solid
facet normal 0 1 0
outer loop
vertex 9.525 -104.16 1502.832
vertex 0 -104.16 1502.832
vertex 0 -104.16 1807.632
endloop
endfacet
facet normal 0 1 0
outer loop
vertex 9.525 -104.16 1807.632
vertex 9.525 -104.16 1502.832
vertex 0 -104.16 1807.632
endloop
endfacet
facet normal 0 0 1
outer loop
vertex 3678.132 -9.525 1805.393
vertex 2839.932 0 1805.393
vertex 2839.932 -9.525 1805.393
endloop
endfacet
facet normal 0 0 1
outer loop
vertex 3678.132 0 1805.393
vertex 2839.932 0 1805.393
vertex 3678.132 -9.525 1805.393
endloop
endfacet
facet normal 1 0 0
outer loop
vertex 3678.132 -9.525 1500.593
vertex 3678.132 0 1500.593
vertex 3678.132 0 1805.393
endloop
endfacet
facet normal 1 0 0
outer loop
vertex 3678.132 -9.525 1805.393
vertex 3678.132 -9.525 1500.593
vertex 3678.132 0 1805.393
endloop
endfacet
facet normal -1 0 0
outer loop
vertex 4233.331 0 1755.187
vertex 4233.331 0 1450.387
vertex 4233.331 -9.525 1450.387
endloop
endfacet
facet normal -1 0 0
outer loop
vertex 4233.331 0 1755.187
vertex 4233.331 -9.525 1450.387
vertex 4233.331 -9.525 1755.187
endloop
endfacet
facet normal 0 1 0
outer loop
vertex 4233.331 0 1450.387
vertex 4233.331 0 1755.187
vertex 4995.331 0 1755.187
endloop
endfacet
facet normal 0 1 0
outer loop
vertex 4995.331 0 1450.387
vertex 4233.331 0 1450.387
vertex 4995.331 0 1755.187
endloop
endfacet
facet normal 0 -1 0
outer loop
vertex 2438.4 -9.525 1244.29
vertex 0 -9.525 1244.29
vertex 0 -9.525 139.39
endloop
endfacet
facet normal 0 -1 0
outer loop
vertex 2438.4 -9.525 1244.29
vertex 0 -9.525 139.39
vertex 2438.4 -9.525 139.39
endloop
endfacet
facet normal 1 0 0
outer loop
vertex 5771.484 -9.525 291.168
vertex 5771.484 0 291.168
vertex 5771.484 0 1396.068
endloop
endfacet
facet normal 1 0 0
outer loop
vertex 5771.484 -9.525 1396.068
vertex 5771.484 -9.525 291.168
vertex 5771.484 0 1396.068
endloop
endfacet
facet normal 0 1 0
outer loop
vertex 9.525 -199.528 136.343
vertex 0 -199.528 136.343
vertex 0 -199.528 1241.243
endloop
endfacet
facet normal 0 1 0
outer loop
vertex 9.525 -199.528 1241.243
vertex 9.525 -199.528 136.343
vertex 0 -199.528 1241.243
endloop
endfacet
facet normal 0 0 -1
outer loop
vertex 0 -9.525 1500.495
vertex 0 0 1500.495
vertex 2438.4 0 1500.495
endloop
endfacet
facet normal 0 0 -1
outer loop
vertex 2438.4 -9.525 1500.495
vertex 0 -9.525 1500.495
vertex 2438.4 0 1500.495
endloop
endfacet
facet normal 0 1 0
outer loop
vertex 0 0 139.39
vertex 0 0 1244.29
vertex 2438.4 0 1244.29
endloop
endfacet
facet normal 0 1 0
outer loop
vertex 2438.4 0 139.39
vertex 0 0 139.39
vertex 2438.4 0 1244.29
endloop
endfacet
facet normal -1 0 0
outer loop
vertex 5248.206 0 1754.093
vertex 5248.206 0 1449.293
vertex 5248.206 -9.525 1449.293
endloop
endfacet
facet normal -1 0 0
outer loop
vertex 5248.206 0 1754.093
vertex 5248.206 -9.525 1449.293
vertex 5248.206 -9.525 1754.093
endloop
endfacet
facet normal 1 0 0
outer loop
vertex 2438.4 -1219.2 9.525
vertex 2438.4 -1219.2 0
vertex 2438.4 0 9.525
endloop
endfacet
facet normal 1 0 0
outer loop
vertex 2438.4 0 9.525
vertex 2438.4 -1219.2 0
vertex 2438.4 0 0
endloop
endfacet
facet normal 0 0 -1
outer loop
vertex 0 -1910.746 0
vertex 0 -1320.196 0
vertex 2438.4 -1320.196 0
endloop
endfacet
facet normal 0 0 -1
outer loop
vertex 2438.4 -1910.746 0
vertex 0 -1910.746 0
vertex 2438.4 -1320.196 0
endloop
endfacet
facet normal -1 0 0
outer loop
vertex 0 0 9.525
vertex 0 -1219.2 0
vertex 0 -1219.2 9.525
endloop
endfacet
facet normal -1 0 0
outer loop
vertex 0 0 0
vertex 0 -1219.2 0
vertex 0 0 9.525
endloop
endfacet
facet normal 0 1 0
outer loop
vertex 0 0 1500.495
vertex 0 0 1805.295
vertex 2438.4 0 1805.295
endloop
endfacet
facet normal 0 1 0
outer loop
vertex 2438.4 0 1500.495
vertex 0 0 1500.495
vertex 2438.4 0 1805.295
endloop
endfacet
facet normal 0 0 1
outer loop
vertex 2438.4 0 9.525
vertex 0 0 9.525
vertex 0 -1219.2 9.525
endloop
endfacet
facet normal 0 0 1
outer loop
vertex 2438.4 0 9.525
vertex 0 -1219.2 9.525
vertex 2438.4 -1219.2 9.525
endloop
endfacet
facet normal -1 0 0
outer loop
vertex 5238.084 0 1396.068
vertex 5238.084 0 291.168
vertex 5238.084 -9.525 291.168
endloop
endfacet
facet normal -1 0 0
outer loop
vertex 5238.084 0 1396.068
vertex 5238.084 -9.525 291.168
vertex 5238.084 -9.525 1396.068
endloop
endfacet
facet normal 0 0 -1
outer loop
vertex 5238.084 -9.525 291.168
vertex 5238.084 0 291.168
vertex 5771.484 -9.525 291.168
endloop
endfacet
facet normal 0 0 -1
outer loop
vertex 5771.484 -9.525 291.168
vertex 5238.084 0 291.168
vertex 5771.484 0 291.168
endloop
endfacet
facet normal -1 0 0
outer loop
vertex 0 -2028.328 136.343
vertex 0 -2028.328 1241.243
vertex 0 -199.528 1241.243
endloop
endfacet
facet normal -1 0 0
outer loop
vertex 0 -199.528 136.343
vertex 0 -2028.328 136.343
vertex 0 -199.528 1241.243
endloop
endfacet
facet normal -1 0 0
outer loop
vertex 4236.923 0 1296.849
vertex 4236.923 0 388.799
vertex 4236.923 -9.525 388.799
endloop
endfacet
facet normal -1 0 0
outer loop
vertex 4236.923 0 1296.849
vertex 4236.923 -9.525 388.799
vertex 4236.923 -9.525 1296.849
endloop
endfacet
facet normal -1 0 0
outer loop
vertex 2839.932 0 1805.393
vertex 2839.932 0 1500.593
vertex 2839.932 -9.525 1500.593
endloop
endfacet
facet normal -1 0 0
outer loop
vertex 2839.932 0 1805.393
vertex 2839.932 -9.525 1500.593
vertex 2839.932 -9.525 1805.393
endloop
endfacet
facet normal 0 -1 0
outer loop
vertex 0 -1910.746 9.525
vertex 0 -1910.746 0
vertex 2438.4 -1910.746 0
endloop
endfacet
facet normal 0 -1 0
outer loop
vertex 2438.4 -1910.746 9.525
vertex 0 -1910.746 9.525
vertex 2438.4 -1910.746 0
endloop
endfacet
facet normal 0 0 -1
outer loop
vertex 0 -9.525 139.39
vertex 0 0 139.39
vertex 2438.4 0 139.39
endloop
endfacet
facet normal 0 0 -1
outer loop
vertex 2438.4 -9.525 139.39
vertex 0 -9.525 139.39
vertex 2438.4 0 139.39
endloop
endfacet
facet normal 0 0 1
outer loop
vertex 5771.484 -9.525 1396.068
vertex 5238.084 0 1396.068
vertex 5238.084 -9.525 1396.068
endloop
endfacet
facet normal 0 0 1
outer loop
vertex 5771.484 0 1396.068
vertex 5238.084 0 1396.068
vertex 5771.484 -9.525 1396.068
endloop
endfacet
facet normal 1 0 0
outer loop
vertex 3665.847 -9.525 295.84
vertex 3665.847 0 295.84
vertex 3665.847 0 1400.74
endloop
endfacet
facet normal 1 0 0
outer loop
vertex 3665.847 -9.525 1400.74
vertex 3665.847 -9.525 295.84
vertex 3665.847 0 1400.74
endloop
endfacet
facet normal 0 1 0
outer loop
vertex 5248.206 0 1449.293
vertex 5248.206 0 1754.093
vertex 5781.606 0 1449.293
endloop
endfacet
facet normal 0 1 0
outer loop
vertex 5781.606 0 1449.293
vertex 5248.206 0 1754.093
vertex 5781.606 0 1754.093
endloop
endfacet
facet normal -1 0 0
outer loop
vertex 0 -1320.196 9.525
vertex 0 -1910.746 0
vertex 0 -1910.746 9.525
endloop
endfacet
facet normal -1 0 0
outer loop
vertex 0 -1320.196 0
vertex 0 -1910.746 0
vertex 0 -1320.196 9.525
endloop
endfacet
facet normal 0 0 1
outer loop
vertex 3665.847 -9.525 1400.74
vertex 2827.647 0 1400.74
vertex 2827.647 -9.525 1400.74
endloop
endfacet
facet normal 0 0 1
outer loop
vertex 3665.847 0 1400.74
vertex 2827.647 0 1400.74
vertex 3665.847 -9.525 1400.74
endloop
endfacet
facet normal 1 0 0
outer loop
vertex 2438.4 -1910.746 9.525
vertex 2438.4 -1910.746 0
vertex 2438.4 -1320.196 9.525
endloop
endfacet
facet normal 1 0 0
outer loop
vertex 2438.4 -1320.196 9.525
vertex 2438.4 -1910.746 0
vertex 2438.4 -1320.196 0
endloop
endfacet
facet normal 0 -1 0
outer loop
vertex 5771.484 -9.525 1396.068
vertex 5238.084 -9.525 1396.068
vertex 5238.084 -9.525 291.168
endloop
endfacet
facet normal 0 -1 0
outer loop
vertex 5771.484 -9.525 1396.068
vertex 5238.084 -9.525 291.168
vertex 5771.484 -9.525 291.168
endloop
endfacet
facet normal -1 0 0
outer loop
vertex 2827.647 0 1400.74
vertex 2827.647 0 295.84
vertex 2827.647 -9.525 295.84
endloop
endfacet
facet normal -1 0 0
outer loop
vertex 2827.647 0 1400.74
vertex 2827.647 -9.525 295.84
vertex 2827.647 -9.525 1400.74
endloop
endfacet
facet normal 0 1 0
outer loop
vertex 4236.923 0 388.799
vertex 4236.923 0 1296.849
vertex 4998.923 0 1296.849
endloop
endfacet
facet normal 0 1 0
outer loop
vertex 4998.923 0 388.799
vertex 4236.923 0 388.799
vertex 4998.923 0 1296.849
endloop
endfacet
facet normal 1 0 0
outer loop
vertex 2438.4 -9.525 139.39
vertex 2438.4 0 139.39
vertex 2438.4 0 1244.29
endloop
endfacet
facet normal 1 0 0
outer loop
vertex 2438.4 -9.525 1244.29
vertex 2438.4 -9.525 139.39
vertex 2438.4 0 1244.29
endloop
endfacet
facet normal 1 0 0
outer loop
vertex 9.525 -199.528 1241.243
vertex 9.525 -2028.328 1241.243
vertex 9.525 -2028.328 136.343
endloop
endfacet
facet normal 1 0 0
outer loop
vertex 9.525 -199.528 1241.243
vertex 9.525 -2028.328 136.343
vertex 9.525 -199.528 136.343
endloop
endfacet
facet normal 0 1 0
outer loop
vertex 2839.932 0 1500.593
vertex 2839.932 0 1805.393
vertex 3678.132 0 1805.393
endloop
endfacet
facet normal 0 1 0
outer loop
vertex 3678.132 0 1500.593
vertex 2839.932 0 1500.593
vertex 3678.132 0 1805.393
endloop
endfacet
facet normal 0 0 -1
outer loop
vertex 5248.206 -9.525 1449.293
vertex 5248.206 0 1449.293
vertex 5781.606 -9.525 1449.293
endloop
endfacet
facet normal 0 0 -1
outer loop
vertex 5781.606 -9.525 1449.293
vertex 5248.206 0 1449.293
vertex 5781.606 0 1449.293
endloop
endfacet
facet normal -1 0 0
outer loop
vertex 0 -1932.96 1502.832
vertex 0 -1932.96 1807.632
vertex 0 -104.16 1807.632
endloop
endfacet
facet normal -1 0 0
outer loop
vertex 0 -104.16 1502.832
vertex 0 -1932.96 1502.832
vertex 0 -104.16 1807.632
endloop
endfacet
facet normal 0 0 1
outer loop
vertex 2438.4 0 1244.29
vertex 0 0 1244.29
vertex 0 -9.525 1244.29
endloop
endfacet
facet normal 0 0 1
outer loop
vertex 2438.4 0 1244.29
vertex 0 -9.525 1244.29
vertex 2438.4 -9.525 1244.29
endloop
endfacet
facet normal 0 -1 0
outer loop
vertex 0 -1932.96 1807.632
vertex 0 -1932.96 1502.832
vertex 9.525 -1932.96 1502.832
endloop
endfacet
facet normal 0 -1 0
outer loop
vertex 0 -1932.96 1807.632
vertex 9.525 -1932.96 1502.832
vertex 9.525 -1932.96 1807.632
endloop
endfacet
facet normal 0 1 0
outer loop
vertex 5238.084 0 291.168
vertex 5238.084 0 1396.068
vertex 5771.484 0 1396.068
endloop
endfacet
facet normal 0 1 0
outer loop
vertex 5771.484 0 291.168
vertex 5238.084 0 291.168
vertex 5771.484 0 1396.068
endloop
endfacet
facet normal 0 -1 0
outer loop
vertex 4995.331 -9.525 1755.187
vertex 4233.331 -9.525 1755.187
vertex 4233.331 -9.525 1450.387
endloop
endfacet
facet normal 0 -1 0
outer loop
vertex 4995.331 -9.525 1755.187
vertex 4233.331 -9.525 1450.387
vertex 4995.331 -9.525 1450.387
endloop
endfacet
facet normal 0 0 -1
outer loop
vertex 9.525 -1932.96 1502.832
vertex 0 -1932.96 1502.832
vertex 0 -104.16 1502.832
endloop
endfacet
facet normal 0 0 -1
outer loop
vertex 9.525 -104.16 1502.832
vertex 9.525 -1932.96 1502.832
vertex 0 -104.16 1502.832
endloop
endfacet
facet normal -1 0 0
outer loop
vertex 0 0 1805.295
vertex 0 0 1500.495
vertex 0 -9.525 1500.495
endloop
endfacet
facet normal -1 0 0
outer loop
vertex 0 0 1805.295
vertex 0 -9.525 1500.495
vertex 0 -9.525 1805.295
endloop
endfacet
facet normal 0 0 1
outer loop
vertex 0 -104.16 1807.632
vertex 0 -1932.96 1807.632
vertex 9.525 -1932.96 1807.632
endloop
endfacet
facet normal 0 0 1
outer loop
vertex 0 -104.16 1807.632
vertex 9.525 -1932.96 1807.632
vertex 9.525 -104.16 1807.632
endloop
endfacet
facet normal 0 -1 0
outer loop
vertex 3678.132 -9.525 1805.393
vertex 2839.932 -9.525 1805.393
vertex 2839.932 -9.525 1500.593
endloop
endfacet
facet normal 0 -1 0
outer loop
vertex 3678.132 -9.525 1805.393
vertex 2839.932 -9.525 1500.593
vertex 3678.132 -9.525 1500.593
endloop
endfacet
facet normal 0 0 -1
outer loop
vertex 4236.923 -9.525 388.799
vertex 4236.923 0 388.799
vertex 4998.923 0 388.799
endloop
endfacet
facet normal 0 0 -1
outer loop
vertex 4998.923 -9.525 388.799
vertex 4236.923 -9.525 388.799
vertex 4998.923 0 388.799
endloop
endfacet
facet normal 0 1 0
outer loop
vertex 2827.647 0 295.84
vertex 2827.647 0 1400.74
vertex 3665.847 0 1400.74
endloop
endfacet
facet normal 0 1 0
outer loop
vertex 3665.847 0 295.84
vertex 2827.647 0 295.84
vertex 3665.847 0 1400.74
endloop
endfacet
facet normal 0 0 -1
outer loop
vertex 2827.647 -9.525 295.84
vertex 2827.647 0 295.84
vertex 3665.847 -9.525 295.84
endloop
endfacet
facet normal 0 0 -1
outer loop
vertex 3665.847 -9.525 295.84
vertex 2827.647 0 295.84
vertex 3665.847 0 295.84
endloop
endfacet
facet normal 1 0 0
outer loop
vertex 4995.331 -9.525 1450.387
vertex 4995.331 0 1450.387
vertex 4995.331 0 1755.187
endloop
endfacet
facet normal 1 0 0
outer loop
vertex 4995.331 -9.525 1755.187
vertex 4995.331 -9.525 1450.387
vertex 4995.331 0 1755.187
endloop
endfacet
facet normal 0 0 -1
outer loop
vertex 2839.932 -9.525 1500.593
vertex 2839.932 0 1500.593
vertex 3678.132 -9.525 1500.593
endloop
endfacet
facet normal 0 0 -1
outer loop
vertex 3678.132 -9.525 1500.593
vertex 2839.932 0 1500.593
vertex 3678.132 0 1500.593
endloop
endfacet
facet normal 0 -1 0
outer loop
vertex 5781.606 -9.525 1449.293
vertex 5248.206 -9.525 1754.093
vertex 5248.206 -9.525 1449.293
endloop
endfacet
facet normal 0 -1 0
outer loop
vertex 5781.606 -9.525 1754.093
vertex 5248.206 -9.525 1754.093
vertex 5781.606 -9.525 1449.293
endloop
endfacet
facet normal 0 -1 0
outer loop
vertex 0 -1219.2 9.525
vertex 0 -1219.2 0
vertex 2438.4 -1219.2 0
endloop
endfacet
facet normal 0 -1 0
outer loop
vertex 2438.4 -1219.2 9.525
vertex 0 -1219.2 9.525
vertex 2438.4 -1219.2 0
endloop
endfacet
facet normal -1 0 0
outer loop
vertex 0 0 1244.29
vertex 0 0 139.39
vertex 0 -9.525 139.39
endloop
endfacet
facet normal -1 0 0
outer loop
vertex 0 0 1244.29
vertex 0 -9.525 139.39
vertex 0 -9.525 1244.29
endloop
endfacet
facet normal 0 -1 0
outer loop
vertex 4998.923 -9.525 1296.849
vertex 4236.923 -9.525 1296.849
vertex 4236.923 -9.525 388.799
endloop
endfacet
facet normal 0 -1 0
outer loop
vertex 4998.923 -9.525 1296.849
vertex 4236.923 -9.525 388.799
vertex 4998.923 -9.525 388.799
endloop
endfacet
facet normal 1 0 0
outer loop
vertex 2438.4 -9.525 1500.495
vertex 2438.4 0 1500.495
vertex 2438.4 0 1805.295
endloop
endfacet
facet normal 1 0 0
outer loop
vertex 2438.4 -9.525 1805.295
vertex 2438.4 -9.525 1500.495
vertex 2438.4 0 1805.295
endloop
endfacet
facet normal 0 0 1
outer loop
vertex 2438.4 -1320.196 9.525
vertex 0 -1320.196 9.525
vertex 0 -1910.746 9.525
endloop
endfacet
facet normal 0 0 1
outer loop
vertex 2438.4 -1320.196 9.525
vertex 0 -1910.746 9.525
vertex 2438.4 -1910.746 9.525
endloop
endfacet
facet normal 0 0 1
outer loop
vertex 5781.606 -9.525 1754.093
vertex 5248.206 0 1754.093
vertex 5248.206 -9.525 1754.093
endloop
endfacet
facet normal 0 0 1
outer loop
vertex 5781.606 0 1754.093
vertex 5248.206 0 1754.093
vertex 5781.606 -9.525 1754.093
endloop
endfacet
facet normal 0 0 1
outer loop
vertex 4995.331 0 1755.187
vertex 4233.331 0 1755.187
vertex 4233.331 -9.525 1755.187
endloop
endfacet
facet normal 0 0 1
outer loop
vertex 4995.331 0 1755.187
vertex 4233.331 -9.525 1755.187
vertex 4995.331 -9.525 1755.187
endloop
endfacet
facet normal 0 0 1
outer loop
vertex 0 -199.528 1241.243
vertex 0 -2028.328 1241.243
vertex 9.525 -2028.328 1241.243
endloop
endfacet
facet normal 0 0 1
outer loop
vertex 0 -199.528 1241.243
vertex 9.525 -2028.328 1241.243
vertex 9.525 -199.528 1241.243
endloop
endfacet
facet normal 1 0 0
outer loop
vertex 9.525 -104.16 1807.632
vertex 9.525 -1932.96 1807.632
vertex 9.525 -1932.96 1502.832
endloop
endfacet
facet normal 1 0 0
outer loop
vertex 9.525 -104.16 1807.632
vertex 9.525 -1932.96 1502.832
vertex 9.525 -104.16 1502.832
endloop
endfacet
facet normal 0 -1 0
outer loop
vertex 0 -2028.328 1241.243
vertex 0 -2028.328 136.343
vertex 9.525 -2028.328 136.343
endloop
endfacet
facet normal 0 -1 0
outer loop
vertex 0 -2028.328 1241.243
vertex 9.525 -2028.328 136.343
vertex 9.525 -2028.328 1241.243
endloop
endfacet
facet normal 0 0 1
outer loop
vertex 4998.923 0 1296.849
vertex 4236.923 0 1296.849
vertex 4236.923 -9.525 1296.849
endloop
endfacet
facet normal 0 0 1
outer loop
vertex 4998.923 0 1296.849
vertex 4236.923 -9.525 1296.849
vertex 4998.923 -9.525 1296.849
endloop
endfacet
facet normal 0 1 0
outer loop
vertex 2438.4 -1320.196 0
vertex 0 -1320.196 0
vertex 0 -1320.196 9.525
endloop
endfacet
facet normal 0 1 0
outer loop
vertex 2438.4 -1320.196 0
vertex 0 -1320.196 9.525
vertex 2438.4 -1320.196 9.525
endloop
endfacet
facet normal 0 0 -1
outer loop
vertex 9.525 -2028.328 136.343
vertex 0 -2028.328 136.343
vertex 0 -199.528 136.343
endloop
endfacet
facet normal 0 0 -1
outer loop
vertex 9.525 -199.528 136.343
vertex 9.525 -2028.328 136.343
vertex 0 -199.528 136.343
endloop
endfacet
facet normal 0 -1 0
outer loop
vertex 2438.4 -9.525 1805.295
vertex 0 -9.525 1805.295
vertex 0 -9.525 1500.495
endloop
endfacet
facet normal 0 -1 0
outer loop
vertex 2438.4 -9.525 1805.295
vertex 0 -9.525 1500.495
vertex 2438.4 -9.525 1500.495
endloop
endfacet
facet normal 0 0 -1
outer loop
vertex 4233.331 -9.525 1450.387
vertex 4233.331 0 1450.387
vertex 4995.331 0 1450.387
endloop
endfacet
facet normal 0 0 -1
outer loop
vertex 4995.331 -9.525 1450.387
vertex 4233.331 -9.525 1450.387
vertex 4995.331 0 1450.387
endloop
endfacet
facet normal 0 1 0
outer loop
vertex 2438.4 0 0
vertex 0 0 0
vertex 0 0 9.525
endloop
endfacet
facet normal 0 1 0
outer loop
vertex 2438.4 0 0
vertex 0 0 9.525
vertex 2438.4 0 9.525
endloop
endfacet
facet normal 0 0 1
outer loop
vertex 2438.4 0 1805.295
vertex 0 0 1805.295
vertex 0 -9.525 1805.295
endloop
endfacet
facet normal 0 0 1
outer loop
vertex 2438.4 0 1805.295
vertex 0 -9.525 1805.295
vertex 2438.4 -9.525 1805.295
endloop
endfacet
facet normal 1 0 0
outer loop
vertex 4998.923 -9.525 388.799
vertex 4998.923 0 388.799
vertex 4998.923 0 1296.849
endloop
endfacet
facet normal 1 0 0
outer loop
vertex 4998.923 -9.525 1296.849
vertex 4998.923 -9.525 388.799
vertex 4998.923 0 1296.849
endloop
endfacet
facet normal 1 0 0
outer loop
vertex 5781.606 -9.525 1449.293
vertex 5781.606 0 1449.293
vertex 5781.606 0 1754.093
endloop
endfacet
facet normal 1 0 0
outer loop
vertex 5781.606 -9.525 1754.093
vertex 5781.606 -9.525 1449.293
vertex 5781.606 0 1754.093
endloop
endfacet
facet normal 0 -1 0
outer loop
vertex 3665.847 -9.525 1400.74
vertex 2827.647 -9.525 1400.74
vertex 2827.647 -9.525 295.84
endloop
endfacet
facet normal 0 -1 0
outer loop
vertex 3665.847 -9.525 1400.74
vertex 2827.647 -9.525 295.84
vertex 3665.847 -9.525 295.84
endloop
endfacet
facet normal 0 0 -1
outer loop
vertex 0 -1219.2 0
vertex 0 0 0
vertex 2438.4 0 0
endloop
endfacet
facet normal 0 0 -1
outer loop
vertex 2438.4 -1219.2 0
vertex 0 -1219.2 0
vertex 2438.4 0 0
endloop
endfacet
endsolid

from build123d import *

# Parameters (mm, degrees)
F0_W      = 2438.4
F0_H      = 1219.2
F1_DEPTH  = 9.525
F2_W      = 2438.4
F2_H      = 590.55
F3_DEPTH  = 9.525
F4_W      = 2438.4
F4_H      = 1104.9
F5_DEPTH  = 9.525
F6_W      = 1828.8
F6_H      = 1104.9
F7_DEPTH  = 9.525
F8_W      = 2438.4
F8_H      = 304.8
F9_DEPTH  = 9.525
F10_W     = 1828.8
F10_H     = 304.8
F11_DEPTH = 9.525
F12_W     = 838.2
F12_H     = 1104.9
F13_DEPTH = 9.525
F14_W     = 762
F14_H     = 908.05
F15_DEPTH = 9.525
F16_W     = 762
F16_H     = 304.8
F17_DEPTH = 9.525
F18_W     = 838.2
F18_H     = 304.8
F19_DEPTH = 9.525
F20_W     = 533.4
F20_H     = 304.8
F21_DEPTH = 9.525
F22_W     = 533.4
F22_H     = 1104.9
F23_DEPTH = 9.525


with BuildPart() as f1:
    # F0 (on Top) → F1 (new body)
    with BuildSketch(Plane.XY):
        with Locations((1219.2, -609.6)):
            Rectangle(F0_W, F0_H)
    extrude(amount=F1_DEPTH)


with BuildPart() as f3:
    # F2 (on Top) → F3 (new body)
    with BuildSketch(Plane.XY):
        with Locations((1219.2, -1615.471365)):
            Rectangle(F2_W, F2_H)
    extrude(amount=F3_DEPTH)


with BuildPart() as f5:
    # F4 (on Front) → F5 (new body)
    with BuildSketch(Plane.XZ):
        with Locations((1219.2, 691.839575)):
            Rectangle(F4_W, F4_H)
    extrude(amount=F5_DEPTH)


with BuildPart() as f7:
    # F6 (on Right) → F7 (new body)
    with BuildSketch(Plane.YZ):
        with Locations((-1113.928136, 688.792892)):
            Rectangle(F6_W, F6_H)
    extrude(amount=F7_DEPTH)


with BuildPart() as f9:
    # F8 (on Front) → F9 (new body)
    with BuildSketch(Plane.XZ):
        with Locations((1219.2, 1652.895459)):
            Rectangle(F8_W, F8_H)
    extrude(amount=F9_DEPTH)


with BuildPart() as f11:
    # F10 (on Right) → F11 (new body)
    with BuildSketch(Plane.YZ):
        with Locations((-1018.56026, 1655.231595)):
            Rectangle(F10_W, F10_H)
    extrude(amount=F11_DEPTH)


with BuildPart() as f13:
    # F12 (on Front) → F13 (new body)
    with BuildSketch(Plane.XZ):
        with Locations((3246.746566, 848.290026)):
            Rectangle(F12_W, F12_H)
    extrude(amount=F13_DEPTH)


with BuildPart() as f15:
    # F14 (on Front) → F15 (new body)
    with BuildSketch(Plane.XZ):
        with Locations((4617.923316, 842.823684)):
            Rectangle(F14_W, F14_H)
    extrude(amount=F15_DEPTH)


with BuildPart() as f17:
    # F16 (on Front) → F17 (new body)
    with BuildSketch(Plane.XZ):
        with Locations((4614.331309, 1602.787137)):
            Rectangle(F16_W, F16_H)
    extrude(amount=F17_DEPTH)


with BuildPart() as f19:
    # F18 (on Front) → F19 (new body)
    with BuildSketch(Plane.XZ):
        with Locations((3259.031773, 1652.993338)):
            Rectangle(F18_W, F18_H)
    extrude(amount=F19_DEPTH)


with BuildPart() as f21:
    # F20 (on Front) → F21 (new body)
    with BuildSketch(Plane.XZ):
        with Locations((5514.90593, 1601.693132)):
            Rectangle(F20_W, F20_H)
    extrude(amount=F21_DEPTH)


with BuildPart() as f23:
    # F22 (on Front) → F23 (new body)
    with BuildSketch(Plane.XZ):
        with Locations((5504.784346, 843.618007)):
            Rectangle(F22_W, F22_H)
    extrude(amount=F23_DEPTH)


solid = Compound([f1.part, f3.part, f5.part, f7.part, f9.part, f11.part, f13.part, f15.part, f17.part, f19.part, f21.part, f23.part])
